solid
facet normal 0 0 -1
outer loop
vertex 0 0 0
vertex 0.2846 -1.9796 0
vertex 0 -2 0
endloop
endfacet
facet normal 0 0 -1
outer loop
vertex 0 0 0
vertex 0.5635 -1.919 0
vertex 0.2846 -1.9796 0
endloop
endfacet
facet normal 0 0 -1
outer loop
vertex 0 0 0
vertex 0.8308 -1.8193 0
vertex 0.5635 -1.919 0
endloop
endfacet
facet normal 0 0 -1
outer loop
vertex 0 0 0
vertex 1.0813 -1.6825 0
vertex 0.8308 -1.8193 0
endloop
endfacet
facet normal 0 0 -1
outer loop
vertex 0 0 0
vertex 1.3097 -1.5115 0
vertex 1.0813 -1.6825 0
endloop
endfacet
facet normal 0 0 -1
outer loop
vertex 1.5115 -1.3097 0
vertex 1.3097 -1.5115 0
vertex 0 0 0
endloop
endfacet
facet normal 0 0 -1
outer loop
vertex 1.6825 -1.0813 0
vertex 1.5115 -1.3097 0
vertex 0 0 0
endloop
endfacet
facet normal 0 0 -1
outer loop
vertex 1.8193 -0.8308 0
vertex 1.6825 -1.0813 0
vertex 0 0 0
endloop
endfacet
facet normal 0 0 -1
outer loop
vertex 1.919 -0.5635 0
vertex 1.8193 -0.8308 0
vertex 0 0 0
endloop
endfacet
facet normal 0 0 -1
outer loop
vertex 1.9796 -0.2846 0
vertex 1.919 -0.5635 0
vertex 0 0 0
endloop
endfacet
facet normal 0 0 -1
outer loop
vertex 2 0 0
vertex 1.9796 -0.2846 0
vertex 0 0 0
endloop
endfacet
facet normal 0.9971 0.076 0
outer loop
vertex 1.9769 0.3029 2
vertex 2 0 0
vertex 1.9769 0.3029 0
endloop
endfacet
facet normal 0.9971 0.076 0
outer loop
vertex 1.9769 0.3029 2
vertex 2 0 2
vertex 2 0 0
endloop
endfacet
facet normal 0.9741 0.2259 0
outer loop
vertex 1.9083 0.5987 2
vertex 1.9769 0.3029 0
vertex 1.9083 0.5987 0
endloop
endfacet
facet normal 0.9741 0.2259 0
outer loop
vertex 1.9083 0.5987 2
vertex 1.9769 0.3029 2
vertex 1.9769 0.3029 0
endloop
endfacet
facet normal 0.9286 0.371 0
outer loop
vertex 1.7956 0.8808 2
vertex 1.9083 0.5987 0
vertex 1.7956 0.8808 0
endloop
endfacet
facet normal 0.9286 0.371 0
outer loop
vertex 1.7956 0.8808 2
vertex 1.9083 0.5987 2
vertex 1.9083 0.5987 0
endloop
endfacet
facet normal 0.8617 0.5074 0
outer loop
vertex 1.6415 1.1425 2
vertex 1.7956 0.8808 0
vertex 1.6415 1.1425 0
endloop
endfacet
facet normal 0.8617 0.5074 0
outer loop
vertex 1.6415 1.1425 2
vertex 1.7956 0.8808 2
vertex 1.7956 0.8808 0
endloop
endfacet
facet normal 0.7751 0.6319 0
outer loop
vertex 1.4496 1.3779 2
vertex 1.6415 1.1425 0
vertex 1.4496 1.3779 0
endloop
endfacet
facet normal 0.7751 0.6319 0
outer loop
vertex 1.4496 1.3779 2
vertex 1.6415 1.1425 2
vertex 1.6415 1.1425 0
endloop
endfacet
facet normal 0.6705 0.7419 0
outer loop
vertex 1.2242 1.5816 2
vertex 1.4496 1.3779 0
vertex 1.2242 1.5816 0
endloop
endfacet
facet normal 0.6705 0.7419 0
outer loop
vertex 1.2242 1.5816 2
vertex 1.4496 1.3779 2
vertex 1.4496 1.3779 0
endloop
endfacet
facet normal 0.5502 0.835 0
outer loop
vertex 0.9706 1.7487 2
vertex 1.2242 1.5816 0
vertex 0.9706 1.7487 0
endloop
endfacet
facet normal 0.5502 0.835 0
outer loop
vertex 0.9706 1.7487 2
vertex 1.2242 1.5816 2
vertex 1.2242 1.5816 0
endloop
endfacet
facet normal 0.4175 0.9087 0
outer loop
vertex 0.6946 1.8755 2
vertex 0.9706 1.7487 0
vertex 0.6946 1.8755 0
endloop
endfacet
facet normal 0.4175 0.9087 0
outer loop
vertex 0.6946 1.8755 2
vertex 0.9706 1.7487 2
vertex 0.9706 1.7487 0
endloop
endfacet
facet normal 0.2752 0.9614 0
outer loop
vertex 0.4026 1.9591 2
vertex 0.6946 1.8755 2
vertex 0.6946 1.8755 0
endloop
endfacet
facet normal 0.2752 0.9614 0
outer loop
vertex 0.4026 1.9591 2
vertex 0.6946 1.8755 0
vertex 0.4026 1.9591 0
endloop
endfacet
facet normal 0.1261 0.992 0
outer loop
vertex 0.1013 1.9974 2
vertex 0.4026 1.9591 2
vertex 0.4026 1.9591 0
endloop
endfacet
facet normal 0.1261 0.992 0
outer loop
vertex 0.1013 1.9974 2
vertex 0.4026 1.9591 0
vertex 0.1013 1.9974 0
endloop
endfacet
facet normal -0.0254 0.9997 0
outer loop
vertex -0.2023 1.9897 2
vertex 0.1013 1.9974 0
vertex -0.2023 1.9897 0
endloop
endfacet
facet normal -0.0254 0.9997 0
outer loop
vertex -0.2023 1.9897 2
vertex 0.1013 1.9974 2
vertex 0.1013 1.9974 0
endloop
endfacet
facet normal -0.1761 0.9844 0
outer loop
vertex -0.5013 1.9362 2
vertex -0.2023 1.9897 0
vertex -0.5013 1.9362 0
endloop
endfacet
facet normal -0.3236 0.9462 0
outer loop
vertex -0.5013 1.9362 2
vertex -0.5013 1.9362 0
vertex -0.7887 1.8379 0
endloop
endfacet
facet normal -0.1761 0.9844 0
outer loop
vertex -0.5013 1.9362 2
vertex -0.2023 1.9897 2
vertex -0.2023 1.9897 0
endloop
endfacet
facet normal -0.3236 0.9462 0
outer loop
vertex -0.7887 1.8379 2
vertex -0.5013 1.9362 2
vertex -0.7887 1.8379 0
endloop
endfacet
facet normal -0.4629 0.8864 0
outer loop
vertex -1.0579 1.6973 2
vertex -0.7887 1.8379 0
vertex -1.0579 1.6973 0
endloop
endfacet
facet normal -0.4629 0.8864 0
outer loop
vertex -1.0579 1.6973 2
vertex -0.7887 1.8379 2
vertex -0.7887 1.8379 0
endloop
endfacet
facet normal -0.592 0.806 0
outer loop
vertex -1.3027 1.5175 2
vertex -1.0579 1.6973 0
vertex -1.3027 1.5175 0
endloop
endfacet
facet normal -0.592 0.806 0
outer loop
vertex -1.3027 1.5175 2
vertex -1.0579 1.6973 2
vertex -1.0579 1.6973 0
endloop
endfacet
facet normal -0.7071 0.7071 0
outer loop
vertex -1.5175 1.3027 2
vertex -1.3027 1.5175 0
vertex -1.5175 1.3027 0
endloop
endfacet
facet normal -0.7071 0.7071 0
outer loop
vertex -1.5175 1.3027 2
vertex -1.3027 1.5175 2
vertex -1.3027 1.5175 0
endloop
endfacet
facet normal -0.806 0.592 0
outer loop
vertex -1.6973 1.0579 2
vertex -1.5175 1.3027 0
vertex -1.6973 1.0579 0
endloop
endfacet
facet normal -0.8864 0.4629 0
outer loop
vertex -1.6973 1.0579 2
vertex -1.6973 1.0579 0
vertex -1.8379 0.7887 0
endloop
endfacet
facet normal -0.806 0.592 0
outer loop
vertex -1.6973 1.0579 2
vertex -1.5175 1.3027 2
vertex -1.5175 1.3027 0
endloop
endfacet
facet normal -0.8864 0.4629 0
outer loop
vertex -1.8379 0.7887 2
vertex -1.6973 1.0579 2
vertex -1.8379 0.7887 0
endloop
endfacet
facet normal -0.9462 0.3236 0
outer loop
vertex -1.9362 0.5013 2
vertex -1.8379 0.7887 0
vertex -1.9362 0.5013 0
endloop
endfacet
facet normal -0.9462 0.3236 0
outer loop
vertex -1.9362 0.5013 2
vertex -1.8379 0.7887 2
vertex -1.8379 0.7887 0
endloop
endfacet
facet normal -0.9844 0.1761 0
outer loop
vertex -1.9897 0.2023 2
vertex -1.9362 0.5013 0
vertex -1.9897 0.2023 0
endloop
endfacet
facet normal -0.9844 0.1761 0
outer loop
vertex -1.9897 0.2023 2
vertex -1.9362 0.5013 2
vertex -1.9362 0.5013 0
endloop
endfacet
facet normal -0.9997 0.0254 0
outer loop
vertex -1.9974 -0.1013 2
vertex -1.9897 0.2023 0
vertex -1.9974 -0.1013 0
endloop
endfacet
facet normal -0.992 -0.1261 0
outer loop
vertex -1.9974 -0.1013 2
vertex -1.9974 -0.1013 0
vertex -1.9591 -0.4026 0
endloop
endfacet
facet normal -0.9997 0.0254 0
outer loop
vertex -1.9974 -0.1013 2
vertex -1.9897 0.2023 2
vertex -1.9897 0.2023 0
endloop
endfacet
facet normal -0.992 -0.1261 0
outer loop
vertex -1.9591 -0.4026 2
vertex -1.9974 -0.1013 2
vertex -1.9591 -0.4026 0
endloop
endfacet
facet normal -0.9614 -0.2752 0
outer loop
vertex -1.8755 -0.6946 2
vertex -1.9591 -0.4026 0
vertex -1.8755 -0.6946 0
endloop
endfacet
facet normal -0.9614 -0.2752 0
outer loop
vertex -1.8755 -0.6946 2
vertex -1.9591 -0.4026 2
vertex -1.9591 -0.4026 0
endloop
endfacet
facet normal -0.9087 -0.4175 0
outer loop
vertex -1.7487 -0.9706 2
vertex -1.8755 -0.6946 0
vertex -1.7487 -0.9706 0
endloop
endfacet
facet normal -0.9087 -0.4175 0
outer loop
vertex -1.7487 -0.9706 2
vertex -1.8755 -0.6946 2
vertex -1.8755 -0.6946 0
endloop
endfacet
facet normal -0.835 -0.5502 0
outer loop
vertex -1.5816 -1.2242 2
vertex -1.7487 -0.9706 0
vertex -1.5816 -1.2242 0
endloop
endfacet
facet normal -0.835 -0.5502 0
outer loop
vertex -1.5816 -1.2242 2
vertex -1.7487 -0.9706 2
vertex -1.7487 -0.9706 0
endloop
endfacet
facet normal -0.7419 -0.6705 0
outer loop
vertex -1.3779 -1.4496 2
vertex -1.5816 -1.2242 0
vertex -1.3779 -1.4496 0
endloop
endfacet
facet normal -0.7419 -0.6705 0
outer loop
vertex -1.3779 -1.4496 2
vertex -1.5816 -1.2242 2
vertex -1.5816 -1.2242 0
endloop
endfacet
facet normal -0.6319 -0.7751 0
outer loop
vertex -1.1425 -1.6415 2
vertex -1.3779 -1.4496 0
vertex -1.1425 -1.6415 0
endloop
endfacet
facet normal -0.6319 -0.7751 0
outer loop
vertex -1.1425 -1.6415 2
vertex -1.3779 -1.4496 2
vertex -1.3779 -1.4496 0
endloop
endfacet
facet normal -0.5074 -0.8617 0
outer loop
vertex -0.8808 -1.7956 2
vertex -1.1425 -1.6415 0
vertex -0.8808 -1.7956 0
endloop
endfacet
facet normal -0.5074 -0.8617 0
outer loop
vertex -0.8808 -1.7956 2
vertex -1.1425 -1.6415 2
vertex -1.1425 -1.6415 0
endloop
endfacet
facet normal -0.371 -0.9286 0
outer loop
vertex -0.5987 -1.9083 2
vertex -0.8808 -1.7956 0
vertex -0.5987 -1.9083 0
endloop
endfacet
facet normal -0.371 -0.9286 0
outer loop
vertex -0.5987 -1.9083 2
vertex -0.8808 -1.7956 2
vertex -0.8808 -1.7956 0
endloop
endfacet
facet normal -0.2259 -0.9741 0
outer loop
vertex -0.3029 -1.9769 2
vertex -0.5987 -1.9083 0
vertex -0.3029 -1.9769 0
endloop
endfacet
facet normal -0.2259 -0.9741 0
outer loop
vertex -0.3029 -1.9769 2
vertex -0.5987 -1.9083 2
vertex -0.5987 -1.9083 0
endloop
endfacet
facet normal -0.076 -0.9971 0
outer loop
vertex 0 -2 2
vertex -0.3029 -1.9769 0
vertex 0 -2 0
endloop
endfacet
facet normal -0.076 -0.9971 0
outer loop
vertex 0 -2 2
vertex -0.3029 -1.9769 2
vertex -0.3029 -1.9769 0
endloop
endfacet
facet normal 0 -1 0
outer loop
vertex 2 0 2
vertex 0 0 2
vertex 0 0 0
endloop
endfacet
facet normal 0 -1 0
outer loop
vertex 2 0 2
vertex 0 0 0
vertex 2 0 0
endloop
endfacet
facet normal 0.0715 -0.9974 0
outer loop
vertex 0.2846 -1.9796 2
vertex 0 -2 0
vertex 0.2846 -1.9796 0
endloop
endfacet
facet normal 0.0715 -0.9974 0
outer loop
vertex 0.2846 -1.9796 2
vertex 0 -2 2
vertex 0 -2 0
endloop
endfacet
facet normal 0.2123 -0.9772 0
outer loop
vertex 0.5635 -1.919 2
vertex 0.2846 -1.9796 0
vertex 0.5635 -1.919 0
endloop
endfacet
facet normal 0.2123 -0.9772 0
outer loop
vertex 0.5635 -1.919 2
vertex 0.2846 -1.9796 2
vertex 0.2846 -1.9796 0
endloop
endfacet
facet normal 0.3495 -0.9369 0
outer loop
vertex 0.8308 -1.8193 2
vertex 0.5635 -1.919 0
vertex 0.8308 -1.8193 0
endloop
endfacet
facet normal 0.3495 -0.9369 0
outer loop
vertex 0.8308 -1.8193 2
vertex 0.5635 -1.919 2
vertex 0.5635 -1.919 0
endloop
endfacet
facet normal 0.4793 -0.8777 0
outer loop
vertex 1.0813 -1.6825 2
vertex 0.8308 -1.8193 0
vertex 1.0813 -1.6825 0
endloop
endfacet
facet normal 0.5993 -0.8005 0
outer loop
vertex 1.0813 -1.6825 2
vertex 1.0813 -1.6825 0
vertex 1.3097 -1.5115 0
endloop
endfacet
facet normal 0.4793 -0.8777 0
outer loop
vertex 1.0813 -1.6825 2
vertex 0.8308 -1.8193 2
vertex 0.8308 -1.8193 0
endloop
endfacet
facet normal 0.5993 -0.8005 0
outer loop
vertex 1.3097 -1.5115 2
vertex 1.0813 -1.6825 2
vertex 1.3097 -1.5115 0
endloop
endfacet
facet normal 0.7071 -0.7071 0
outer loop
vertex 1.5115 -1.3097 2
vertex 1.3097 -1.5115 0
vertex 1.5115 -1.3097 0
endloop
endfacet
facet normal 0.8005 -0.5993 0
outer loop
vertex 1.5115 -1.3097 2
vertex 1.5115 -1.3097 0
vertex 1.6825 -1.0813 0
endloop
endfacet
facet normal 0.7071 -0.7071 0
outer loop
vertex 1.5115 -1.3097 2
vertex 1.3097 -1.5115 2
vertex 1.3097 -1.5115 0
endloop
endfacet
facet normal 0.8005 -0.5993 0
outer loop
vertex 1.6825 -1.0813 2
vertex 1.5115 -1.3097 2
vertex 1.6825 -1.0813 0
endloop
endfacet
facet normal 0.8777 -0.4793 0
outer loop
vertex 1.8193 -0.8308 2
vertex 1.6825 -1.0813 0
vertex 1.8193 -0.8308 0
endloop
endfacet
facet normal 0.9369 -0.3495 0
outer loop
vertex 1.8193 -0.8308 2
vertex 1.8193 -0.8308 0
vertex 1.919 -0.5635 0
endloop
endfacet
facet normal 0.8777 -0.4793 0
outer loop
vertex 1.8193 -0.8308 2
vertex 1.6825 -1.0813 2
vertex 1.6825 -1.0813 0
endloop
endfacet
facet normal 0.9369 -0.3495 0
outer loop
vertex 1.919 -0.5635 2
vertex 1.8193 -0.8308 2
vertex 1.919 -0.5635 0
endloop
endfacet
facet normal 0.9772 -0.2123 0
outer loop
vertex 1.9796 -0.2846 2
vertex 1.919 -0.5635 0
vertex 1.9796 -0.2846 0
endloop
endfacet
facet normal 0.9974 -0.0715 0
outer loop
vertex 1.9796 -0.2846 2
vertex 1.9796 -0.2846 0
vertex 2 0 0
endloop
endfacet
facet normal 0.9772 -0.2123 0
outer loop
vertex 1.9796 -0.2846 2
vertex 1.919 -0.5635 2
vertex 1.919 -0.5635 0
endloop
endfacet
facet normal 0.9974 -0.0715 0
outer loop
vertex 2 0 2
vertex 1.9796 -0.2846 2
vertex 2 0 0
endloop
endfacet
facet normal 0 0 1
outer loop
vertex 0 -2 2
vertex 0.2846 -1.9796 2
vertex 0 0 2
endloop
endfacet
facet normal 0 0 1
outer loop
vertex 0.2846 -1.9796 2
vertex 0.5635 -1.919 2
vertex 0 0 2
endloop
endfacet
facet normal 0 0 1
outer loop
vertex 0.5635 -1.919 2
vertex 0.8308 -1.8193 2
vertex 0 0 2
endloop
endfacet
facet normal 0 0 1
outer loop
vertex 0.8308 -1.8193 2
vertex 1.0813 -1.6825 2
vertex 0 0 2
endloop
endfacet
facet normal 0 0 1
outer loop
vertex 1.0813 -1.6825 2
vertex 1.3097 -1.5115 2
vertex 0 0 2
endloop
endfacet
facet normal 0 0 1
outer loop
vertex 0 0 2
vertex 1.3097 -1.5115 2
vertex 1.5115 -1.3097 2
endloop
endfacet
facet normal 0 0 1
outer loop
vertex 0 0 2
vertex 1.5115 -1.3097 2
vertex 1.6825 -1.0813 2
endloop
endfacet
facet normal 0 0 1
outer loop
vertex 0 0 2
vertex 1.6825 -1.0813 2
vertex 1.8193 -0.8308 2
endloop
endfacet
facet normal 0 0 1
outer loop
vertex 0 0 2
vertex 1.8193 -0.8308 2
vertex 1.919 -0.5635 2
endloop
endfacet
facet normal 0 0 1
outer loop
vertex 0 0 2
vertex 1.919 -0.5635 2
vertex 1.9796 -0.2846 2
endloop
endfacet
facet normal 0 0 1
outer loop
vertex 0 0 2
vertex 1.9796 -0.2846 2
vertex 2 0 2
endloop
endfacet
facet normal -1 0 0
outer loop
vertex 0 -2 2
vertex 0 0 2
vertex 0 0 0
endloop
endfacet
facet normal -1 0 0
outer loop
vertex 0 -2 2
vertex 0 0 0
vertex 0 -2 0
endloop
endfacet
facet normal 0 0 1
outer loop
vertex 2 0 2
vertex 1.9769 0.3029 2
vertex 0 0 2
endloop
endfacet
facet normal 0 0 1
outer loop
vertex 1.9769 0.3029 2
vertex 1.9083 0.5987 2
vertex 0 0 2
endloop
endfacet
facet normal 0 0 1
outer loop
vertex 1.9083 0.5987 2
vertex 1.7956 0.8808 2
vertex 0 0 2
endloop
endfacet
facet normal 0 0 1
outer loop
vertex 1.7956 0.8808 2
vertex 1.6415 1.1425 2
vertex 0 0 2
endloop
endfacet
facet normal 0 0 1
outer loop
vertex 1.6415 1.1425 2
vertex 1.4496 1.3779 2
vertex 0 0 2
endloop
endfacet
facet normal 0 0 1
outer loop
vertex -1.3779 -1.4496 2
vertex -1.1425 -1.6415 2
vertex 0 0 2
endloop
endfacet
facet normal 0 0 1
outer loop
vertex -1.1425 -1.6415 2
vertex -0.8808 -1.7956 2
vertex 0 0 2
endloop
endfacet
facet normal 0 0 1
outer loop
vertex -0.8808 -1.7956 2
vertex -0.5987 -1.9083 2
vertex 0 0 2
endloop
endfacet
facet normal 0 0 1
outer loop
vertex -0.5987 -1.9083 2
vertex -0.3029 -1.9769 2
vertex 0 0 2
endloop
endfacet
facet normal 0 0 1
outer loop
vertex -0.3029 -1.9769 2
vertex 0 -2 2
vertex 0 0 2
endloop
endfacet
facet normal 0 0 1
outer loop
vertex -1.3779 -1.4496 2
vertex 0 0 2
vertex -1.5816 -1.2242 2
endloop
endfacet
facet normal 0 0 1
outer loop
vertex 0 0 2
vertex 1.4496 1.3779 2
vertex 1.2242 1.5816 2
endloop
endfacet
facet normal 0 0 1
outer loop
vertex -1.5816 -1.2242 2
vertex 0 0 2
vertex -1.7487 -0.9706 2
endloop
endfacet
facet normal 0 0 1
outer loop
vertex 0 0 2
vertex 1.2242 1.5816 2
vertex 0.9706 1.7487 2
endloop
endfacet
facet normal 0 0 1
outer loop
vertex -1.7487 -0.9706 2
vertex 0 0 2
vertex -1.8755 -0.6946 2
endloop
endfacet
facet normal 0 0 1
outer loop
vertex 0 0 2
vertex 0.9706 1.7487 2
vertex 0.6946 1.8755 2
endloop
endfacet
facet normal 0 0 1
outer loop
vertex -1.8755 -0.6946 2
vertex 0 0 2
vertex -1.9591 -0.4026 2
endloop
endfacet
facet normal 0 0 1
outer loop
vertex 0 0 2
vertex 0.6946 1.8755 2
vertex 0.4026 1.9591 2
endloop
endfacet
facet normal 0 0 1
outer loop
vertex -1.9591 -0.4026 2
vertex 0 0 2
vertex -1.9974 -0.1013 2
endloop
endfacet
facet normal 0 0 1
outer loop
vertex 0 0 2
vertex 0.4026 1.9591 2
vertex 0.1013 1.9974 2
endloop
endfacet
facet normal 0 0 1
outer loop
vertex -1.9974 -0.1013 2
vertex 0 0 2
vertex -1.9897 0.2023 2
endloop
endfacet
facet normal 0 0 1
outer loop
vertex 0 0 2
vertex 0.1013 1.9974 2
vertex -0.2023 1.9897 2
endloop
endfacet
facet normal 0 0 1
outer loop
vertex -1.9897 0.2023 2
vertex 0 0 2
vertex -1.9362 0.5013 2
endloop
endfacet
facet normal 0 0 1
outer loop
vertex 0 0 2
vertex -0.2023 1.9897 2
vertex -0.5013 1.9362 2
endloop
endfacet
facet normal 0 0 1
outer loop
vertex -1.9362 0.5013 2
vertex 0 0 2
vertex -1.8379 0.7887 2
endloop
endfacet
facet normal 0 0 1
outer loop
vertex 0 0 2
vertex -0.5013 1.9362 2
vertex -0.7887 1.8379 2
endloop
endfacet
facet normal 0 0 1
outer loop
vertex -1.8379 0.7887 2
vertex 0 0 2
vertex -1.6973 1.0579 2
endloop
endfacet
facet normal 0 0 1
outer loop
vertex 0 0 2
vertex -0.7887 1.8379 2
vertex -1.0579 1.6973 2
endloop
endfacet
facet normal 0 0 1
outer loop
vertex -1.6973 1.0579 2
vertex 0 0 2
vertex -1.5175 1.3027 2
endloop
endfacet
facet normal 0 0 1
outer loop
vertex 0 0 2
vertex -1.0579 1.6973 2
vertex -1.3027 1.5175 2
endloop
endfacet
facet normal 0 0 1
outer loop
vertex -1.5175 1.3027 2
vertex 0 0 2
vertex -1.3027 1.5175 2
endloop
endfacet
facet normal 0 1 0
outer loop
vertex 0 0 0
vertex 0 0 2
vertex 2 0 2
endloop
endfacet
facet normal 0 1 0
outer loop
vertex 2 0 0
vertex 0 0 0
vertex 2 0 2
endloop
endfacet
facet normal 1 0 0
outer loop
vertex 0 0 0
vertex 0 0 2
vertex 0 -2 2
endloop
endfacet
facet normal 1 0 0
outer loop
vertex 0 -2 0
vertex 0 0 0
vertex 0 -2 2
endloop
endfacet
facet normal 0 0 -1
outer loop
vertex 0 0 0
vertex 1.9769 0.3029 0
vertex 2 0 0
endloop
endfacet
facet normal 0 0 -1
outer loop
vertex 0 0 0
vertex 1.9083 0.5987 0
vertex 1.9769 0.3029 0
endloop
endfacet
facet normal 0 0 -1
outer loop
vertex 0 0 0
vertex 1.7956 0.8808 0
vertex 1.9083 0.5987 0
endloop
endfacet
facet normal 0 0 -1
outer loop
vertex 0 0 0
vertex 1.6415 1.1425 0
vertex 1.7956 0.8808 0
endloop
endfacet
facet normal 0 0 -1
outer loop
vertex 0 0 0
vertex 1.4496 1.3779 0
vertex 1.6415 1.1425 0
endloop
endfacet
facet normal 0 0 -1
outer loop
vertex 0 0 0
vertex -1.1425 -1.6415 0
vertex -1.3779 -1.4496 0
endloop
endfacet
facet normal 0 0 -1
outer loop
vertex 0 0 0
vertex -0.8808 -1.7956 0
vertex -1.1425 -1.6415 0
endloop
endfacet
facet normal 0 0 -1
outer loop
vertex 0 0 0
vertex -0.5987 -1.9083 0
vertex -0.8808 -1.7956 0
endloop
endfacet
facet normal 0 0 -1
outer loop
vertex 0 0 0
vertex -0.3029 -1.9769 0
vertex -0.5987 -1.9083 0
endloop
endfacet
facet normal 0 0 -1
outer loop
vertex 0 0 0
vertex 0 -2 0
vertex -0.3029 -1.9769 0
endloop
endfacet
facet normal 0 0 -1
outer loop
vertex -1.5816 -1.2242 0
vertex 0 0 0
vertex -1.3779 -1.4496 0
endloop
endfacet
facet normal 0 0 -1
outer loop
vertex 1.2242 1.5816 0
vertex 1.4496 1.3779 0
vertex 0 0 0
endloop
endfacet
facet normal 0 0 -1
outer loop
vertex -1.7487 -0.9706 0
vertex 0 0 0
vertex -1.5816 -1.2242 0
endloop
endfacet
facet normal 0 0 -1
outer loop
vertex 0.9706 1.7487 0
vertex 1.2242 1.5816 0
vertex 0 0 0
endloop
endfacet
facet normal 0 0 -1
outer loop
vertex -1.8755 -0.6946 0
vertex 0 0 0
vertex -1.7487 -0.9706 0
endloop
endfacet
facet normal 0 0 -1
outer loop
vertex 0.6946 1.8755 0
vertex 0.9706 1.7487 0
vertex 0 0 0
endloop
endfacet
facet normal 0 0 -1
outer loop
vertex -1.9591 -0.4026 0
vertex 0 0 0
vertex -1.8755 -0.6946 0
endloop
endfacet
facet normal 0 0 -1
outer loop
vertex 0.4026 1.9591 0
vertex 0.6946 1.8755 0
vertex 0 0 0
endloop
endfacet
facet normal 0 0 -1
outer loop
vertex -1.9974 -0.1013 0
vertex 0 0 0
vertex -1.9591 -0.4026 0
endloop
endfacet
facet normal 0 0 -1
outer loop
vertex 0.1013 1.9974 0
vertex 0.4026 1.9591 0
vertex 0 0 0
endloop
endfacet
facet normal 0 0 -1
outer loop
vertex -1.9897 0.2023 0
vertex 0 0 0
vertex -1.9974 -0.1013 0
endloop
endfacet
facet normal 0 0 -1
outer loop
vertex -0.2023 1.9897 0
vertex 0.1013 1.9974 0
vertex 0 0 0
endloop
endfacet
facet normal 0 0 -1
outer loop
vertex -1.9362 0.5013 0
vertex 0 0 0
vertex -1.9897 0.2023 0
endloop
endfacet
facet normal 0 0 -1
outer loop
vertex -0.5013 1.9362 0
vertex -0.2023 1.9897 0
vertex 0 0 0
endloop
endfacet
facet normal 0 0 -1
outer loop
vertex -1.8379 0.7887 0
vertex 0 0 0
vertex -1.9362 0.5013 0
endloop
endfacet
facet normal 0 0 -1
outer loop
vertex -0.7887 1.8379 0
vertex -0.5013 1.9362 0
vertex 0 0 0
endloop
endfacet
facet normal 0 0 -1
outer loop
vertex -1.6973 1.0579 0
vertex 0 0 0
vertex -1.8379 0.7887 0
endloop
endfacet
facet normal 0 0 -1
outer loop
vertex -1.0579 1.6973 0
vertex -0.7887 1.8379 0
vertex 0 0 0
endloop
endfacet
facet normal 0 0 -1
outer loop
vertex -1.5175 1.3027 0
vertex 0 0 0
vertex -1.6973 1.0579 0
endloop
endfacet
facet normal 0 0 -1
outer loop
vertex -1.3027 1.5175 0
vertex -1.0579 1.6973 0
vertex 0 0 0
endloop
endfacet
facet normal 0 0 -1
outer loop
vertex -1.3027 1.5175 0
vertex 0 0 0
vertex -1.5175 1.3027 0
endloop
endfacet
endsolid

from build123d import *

# Parameters (mm, degrees)
CYLINDER_W        = 2
CYLINDER_H        = 2
CYLINDER_ANGLE    = 270
CYLINDER001_W     = 2
CYLINDER001_H     = 2
CYLINDER001_ANGLE = 90


with BuildPart() as cilindro:
    # Cylinder → Cylinder (revolve)
    with BuildSketch(Plane.XZ):
        with Locations((1, 1)):
            Rectangle(CYLINDER_W, CYLINDER_H)
    revolve(axis=Axis((0, 0, 0), (0, 0, 1)), revolution_arc=CYLINDER_ANGLE)


with BuildPart() as cilindro001:
    # Cylinder001 → Cylinder001 (revolve)
    with BuildSketch(Plane(origin=(0, 0, 0), x_dir=(0, -1, 0), z_dir=(-1, 0, 0))):
        with Locations((1, 1)):
            Rectangle(CYLINDER001_W, CYLINDER001_H)
    revolve(axis=Axis((0, 0, 0), (0, 0, 1)), revolution_arc=CYLINDER001_ANGLE)


solid = Compound([cilindro.part, cilindro001.part])
